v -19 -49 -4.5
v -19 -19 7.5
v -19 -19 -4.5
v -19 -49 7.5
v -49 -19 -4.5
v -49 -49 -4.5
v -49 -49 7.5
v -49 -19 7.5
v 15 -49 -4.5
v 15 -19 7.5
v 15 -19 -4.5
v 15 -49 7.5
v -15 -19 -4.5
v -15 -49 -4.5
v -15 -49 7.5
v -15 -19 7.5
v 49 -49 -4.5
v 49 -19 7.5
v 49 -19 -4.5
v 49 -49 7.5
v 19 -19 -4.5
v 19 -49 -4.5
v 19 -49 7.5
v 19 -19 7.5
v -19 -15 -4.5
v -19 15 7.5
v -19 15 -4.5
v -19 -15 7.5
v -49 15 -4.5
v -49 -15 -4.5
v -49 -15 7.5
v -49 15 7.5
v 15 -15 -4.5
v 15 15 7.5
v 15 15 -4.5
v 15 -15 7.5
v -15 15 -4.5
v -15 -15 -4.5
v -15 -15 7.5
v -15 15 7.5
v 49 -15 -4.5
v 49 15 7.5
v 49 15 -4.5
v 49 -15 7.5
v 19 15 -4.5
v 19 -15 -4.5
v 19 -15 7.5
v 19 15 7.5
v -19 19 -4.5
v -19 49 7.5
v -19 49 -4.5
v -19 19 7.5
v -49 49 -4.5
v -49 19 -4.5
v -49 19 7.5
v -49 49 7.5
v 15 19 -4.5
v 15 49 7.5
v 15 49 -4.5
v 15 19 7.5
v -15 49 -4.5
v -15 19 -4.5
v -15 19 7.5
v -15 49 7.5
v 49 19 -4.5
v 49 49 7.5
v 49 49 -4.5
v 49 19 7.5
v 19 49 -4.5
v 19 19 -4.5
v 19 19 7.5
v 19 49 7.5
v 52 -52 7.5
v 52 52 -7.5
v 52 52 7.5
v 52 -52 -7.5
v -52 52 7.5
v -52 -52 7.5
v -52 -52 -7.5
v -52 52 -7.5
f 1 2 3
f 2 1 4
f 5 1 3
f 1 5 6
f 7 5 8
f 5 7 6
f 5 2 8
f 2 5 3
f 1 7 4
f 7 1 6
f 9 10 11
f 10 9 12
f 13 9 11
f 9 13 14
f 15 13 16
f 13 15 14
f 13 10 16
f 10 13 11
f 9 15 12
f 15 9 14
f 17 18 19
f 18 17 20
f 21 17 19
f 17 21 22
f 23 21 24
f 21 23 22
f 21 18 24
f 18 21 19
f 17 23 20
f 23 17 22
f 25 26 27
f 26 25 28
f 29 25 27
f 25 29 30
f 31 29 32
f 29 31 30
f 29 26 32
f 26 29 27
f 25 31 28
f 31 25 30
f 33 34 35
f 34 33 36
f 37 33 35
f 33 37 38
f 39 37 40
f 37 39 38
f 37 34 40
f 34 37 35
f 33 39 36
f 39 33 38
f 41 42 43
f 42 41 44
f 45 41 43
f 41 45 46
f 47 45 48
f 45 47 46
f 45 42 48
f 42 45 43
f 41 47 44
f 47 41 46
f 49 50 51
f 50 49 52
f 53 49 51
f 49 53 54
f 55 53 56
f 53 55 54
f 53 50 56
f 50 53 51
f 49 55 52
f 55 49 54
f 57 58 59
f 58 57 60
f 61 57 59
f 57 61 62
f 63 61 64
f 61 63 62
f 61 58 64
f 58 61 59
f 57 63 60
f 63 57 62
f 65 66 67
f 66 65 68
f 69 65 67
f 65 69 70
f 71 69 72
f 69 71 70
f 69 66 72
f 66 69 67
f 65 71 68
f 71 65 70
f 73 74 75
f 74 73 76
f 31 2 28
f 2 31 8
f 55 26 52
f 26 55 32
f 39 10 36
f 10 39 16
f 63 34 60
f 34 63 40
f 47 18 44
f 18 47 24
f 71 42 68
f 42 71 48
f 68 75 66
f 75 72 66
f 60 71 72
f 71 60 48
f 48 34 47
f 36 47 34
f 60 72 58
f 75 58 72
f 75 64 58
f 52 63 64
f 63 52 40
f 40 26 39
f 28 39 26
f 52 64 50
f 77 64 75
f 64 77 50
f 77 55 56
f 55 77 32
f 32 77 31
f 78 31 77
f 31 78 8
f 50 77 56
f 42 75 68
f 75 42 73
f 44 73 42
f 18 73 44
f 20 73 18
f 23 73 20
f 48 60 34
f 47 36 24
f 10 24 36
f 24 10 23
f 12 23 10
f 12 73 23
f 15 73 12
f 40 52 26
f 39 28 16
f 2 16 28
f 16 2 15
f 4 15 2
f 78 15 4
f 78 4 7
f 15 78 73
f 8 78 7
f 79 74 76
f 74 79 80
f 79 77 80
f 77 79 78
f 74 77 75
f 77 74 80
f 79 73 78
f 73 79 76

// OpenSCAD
$fn = 32;

// ----------------------------------------------------------------------
// Pocket plate 104 x 104 x 15
// 3 x 3 pockets 30 mm square, 12 mm deep
// ----------------------------------------------------------------------

// --- parameters (mm) ---
thickness = 15;  // plate thickness
floor_t = 3;     // material left under each pocket
pocket = 30;     // pocket side length
pitch_x = 34;    // pocket pitch along X
pitch_y = 34;    // pocket pitch along Y
cols = 3;        // pockets per row
rows = 3;        // rows of pockets

// --- derived feature positions (mm) ---
depth = thickness - floor_t;        // = 12   pocket depth, down to the floor
span_x = (cols - 1) * pitch_x;      // = 68   distance between outer pockets
span_y = (rows - 1) * pitch_y;      // = 68   distance between outer pocket rows
origin_x = -span_x / 2;             // = -34   X of the first pocket
origin_y = -span_y / 2;             // = -34   Y of the first pocket
plate = [span_x + pocket + 6, span_y + pocket + 6, thickness];  // = [104, 104, 15]   overall size: pockets plus 3 mm of wall on each side
feature_centers = [
  [origin_x + 0 * pitch_x, origin_y + 0 * pitch_y],
  [origin_x + 1 * pitch_x, origin_y + 0 * pitch_y],
  [origin_x + 2 * pitch_x, origin_y + 0 * pitch_y],
  [origin_x + 0 * pitch_x, origin_y + 1 * pitch_y],
  [origin_x + 1 * pitch_x, origin_y + 1 * pitch_y],
  [origin_x + 2 * pitch_x, origin_y + 1 * pitch_y],
  [origin_x + 0 * pitch_x, origin_y + 2 * pitch_y],
  [origin_x + 1 * pitch_x, origin_y + 2 * pitch_y],
  [origin_x + 2 * pitch_x, origin_y + 2 * pitch_y]
];   // pocket centres, used verbatim by the cutter loop

// plate outline, then one pocket per centre in feature_centers
difference() {
  cube(plate, center = true);
  for (centre = feature_centers)
    translate([centre[0] - pocket / 2, centre[1] - pocket / 2, plate[2] / 2 - depth])
      cube([pocket, pocket, depth + 1]);  // centred on the declared pocket centre
}
